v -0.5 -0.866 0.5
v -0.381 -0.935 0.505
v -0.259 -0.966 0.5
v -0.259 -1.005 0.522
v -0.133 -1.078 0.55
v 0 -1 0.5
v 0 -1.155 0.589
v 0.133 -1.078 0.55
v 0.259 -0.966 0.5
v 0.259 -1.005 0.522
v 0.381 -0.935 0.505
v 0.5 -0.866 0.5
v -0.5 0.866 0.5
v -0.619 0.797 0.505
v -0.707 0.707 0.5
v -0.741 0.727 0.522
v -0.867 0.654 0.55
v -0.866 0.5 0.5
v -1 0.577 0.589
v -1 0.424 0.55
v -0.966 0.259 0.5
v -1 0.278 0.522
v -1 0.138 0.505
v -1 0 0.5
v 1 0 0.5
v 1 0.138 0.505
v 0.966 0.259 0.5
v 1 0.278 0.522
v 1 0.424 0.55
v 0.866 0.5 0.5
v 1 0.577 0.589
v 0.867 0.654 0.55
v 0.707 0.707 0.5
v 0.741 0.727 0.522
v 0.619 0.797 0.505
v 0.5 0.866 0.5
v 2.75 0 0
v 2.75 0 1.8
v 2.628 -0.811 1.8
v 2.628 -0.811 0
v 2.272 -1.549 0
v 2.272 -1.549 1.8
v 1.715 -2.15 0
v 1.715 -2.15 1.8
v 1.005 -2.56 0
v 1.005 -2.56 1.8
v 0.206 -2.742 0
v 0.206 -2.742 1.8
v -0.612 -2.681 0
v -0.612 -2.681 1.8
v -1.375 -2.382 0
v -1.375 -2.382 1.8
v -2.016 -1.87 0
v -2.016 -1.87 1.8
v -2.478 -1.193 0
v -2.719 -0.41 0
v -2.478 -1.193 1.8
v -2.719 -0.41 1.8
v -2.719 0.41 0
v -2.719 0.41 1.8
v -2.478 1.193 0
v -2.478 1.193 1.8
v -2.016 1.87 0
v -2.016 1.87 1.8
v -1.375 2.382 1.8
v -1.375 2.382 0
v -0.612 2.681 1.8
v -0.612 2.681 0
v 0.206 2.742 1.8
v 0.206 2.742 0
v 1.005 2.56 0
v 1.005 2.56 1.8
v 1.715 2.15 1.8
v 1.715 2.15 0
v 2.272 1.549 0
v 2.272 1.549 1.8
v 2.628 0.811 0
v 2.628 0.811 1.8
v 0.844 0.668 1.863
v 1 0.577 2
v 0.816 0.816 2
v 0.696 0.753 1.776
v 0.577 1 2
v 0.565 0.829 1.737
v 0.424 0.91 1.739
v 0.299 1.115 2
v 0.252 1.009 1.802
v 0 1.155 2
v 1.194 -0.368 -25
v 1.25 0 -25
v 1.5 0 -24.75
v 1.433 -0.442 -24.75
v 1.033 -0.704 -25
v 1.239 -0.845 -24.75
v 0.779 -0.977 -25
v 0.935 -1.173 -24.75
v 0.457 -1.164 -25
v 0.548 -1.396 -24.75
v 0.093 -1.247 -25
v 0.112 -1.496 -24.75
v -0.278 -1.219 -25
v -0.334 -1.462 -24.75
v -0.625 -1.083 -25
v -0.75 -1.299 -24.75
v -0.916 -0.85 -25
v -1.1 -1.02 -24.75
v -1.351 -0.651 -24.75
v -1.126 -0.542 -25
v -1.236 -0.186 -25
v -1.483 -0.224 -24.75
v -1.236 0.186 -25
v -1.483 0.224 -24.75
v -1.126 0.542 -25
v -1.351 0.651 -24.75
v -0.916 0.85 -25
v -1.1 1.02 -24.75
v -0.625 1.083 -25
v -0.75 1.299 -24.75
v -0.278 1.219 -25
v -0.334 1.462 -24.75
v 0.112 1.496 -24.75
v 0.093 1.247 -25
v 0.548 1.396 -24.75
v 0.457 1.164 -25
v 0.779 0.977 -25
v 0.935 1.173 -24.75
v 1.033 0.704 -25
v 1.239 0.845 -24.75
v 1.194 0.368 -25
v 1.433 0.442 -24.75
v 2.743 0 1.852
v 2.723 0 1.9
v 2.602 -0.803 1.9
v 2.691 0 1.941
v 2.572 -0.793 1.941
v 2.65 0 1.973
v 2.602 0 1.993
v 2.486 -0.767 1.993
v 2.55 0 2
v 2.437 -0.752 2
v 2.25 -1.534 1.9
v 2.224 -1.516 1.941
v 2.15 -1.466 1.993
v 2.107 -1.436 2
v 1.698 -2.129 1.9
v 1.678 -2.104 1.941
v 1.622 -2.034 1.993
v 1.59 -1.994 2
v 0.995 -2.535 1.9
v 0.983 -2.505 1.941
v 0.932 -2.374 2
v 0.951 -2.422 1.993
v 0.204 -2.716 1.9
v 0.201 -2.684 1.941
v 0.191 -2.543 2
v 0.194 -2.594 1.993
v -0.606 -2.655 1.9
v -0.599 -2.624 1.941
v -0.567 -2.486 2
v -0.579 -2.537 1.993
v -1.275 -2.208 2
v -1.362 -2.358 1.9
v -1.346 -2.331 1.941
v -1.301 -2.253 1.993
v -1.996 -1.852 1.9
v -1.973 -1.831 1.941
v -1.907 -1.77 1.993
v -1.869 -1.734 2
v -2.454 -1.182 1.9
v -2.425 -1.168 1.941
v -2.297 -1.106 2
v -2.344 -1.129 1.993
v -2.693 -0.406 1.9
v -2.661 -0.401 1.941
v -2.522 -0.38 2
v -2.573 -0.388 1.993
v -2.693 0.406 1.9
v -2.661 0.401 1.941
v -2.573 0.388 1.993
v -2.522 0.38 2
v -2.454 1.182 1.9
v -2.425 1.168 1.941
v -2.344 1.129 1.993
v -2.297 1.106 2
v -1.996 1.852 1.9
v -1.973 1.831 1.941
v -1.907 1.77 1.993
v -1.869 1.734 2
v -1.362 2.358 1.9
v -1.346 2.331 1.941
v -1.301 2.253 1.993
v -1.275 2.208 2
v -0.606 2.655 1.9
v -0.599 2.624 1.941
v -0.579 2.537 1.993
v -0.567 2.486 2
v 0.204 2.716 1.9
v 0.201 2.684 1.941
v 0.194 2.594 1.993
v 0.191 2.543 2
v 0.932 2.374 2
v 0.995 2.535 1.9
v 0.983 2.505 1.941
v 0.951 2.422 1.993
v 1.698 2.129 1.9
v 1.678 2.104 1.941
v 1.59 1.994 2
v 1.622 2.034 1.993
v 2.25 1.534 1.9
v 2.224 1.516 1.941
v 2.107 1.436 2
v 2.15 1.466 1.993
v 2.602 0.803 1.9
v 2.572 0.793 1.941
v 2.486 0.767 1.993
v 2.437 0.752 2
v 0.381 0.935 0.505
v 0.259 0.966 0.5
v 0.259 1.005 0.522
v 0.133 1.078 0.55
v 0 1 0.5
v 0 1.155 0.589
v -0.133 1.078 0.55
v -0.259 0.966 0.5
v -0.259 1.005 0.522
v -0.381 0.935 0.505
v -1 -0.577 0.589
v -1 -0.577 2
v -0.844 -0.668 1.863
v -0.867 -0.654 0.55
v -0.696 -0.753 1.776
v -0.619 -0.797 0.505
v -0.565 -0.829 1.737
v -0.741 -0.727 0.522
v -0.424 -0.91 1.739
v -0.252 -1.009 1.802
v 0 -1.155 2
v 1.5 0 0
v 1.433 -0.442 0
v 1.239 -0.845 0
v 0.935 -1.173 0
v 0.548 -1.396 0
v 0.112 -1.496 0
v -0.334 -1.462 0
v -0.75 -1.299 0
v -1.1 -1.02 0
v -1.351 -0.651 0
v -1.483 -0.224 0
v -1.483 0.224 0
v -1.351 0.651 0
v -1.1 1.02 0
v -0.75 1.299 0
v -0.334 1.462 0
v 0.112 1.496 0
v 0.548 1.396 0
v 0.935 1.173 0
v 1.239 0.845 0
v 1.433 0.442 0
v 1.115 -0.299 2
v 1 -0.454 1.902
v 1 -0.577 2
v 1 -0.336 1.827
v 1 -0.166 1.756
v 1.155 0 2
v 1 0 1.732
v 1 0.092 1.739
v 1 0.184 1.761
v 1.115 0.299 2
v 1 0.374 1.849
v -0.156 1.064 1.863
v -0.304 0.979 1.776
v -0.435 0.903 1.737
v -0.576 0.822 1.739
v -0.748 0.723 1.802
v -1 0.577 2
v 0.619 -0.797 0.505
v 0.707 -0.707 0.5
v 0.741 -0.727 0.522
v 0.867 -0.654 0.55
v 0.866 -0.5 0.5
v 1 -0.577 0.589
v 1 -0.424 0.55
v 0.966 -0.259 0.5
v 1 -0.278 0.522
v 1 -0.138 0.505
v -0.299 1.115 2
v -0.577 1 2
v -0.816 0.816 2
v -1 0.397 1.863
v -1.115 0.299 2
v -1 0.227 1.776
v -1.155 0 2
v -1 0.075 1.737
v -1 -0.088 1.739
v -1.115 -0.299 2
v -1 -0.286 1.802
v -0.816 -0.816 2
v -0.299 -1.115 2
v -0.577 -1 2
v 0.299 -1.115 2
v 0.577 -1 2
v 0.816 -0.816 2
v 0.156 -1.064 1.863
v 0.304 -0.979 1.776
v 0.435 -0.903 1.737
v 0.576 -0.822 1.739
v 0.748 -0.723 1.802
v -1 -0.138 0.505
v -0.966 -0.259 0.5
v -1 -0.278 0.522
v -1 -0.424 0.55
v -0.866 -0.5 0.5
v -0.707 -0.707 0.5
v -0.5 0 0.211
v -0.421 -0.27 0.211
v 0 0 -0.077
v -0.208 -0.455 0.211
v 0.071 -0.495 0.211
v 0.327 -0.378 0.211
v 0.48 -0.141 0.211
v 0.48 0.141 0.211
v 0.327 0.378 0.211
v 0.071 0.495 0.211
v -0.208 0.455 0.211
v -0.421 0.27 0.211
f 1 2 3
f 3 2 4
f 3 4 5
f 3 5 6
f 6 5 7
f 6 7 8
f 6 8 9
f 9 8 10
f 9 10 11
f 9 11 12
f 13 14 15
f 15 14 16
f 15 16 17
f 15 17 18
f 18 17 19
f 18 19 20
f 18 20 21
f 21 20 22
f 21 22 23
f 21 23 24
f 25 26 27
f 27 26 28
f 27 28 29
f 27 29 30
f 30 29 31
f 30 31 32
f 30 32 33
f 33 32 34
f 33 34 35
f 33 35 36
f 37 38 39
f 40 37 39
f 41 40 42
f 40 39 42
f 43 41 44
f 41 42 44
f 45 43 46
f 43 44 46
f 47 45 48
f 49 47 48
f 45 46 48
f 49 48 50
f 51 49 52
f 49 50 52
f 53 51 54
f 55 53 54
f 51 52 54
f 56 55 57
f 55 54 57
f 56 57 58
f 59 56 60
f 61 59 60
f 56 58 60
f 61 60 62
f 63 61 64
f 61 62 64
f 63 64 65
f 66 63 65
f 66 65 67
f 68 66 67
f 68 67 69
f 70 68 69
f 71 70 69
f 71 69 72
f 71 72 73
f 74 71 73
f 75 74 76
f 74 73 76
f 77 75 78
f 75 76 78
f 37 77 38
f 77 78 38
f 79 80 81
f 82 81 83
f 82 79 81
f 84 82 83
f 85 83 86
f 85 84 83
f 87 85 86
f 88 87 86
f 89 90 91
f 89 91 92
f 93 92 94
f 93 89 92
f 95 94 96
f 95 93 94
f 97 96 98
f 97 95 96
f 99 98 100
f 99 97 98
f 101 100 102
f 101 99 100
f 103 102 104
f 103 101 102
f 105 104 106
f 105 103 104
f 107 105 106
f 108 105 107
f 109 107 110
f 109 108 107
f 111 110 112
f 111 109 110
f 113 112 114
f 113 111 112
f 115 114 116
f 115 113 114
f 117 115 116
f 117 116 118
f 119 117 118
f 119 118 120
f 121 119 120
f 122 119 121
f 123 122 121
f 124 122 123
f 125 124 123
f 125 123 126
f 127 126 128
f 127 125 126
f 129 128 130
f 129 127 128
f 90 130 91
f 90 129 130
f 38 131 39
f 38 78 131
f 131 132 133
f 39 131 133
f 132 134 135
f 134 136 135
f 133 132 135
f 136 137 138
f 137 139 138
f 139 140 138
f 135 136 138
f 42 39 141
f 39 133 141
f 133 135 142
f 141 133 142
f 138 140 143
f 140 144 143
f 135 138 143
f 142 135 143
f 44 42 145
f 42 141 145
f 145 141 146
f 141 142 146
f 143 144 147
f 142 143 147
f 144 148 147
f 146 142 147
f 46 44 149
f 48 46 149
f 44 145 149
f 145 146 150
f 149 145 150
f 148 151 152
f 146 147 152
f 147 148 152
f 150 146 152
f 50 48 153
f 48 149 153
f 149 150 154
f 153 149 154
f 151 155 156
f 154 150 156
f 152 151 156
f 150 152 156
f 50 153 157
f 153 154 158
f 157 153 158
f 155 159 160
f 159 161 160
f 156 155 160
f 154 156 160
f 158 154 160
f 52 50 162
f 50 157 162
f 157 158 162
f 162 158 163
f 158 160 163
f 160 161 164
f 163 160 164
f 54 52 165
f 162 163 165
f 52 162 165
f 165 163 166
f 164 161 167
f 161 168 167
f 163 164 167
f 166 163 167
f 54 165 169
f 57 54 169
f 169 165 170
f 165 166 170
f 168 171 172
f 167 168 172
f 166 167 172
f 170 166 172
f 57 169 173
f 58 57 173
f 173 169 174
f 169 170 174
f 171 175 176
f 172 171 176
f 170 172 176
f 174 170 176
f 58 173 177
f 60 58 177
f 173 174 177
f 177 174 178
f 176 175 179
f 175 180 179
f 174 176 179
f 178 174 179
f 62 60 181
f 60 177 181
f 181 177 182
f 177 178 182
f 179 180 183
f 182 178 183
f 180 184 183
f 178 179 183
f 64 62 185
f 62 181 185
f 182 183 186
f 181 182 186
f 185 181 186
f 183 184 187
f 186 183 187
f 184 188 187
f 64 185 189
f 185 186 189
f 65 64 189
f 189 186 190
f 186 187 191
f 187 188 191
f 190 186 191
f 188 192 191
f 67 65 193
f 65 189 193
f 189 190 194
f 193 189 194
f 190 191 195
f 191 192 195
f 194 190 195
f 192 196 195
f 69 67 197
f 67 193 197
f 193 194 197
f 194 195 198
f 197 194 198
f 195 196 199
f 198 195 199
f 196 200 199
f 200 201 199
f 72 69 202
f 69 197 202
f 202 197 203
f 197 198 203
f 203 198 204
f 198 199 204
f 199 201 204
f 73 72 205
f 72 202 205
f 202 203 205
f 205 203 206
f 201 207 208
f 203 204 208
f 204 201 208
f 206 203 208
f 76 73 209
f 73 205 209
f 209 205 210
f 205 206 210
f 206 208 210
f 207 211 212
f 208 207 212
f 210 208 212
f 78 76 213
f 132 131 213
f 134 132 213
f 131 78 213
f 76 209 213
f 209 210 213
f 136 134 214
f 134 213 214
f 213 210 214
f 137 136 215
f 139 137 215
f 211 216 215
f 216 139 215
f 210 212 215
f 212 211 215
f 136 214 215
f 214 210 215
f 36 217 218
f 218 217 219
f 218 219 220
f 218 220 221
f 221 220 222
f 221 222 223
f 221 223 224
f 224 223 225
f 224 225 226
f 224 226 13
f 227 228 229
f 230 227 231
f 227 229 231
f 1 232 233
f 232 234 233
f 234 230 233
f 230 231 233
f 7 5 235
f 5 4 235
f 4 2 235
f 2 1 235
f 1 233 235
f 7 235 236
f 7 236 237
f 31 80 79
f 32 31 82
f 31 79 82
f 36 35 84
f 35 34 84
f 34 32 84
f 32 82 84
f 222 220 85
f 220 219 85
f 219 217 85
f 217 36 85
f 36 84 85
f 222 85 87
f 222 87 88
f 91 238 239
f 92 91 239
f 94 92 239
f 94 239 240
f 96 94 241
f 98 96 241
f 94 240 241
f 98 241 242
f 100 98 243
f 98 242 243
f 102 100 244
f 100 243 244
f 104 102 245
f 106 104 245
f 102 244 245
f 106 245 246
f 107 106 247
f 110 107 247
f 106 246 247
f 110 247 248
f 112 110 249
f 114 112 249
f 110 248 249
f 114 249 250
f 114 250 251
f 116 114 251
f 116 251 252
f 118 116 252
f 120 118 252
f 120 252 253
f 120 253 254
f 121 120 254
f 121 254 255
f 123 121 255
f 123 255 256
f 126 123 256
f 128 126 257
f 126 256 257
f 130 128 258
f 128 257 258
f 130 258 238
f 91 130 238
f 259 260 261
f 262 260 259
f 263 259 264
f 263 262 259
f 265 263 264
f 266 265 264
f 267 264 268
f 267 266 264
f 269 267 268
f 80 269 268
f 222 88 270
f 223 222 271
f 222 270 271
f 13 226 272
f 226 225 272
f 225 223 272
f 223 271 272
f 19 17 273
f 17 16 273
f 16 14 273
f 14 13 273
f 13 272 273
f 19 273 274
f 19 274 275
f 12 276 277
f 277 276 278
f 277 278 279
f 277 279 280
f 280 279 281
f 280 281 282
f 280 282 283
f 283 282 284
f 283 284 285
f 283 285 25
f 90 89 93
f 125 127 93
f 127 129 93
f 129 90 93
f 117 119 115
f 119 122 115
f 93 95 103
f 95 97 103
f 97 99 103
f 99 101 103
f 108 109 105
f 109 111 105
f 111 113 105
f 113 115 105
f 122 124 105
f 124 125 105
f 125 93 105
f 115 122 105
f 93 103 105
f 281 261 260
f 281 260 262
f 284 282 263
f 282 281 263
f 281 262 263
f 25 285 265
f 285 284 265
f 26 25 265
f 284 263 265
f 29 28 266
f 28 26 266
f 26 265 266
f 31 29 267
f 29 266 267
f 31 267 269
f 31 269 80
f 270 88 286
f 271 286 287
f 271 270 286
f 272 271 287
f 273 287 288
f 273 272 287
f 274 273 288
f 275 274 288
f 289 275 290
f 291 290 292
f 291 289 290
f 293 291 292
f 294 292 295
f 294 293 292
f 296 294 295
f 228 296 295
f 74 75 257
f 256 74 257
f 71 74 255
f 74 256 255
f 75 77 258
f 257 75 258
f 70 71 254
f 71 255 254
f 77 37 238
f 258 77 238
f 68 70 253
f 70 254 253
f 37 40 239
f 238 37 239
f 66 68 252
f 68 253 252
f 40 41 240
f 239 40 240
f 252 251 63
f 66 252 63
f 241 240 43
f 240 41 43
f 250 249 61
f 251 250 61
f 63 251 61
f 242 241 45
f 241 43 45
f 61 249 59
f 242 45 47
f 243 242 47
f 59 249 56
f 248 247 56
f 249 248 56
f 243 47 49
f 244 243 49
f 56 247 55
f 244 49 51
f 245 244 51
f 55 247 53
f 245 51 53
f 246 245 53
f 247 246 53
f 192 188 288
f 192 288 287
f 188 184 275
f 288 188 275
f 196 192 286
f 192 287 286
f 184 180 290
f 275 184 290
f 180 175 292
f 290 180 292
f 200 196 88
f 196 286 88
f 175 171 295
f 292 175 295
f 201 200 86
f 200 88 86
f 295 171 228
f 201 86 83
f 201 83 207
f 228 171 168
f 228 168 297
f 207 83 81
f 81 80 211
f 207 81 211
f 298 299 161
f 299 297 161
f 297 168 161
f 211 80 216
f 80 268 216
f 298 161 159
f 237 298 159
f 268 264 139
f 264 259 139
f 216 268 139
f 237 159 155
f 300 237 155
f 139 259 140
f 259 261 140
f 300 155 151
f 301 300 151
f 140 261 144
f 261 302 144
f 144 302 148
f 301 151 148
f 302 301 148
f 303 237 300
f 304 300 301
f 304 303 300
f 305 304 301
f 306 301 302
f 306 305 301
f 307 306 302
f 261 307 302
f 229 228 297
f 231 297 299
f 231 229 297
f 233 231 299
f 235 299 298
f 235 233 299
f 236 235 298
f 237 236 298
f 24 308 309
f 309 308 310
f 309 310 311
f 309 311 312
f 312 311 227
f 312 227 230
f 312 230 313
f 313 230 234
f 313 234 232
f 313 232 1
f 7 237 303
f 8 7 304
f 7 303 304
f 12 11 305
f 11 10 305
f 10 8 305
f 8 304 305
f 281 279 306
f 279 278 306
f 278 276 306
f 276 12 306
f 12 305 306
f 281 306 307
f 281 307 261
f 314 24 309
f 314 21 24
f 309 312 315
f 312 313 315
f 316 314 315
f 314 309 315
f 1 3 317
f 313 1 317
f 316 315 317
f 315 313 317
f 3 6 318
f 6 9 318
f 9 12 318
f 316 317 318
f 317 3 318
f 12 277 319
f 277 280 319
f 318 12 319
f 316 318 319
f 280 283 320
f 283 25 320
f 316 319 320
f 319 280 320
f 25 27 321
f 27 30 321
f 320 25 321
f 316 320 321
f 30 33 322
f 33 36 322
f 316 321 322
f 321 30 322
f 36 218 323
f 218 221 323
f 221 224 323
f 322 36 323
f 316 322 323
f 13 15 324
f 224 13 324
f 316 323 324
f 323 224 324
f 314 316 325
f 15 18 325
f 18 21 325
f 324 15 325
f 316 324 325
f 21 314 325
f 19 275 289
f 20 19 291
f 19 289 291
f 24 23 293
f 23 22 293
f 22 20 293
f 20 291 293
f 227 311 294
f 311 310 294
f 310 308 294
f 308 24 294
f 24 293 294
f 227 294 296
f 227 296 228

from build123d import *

# Parameters (mm, degrees)
CUT_EXTRUDE1_REACH = 29.279
CHAMFER1_SIZE      = 0.25
FILLET1_R          = 0.2


with BuildPart() as part:
    # Sketch1 → Revolve1 (revolve)
    with BuildSketch(Plane(origin=(0, 0, 0), x_dir=(0, 0, -1), z_dir=(1, 0, 0)), mode=Mode.PRIVATE) as revolve1_sk:
        Polygon((0, 1.5), (0, 2.75), (-2, 2.75), (-2, 0), (25, 0), (25, 1.5), align=None)
    revolve(revolve1_sk.sketch.rotate(Axis((0, 0, 13.782385085), (0, 0, -1)), 90), axis=Axis((0, 0, 13.782385085), (0, 0, -1)))

    # Sketch2 → Cut-Revolve1 (revolve, cut)
    with BuildSketch(Plane(origin=(0, 0, 0), x_dir=(0, 0, -1), z_dir=(1, 0, 0)), mode=Mode.PRIVATE) as cut_revolve1_sk:
        Polygon((0.077350269, 0), (-0.5, 1), (-2, 1), (-2, 0), align=None)
    revolve(cut_revolve1_sk.sketch.rotate(Axis((0, 0, 0), (0, 0, 1)), 90), axis=Axis((0, 0, 0), (0, 0, 1)), mode=Mode.SUBTRACT)

    # Cut-Extrude1: up to this cone (the profile starts inside it)
    cut_extrude1_end = Plane(origin=(0, 0, 2), z_dir=(0, 0, 1)).offset(-2.077349269) * Cone(1.732e-06, 61.408868018, 35.454425481, align=(Align.CENTER, Align.CENTER, Align.MIN), mode=Mode.PRIVATE)
    # Sketch3 → Cut-Extrude1 (cut, up to the surface)
    with BuildSketch(Plane.XY.offset(2), mode=Mode.PRIVATE) as cut_extrude1_sk1:
        Polygon((0, 1.154700538), (-1, 0.577350269), (-1, -0.577350269), (0, -1.154700538), (1, -0.577350269), (1, 0.577350269), align=None)
    cut_extrude1_tool1 = extrude(cut_extrude1_sk1.sketch, amount=-CUT_EXTRUDE1_REACH, mode=Mode.PRIVATE) & cut_extrude1_end
    add(cut_extrude1_tool1.solids().sort_by_distance((0, 0, 2))[0], mode=Mode.SUBTRACT)

    # Sketch4 → Cut-Revolve2 (revolve, cut)
    with BuildSketch(Plane(origin=(0, 0, 0), x_dir=(0, 0, -1), z_dir=(1, 0, 0)), mode=Mode.PRIVATE) as cut_revolve2_sk:
        Polygon((-1.5, 0.866025404), (-2.5, 0.866025404), (-2.5, 1.443375673), align=None)
    revolve(cut_revolve2_sk.sketch.rotate(Axis((0, 0, 0), (0, 0, 1)), 270), axis=Axis((0, 0, 0), (0, 0, 1)), mode=Mode.SUBTRACT)

    # Chamfer1
    chamfer1_edges = [part.edges().sort_by_distance(p)[0] for p in [
        (-1.5, 0, -25),
    ]]
    chamfer(chamfer1_edges, length=CHAMFER1_SIZE)

    # Fillet1
    fillet1_edges = [part.edges().sort_by_distance(p)[0] for p in [
        (-2.75, 0, 2),
    ]]
    fillet(fillet1_edges, radius=FILLET1_R)


solid = part.part
